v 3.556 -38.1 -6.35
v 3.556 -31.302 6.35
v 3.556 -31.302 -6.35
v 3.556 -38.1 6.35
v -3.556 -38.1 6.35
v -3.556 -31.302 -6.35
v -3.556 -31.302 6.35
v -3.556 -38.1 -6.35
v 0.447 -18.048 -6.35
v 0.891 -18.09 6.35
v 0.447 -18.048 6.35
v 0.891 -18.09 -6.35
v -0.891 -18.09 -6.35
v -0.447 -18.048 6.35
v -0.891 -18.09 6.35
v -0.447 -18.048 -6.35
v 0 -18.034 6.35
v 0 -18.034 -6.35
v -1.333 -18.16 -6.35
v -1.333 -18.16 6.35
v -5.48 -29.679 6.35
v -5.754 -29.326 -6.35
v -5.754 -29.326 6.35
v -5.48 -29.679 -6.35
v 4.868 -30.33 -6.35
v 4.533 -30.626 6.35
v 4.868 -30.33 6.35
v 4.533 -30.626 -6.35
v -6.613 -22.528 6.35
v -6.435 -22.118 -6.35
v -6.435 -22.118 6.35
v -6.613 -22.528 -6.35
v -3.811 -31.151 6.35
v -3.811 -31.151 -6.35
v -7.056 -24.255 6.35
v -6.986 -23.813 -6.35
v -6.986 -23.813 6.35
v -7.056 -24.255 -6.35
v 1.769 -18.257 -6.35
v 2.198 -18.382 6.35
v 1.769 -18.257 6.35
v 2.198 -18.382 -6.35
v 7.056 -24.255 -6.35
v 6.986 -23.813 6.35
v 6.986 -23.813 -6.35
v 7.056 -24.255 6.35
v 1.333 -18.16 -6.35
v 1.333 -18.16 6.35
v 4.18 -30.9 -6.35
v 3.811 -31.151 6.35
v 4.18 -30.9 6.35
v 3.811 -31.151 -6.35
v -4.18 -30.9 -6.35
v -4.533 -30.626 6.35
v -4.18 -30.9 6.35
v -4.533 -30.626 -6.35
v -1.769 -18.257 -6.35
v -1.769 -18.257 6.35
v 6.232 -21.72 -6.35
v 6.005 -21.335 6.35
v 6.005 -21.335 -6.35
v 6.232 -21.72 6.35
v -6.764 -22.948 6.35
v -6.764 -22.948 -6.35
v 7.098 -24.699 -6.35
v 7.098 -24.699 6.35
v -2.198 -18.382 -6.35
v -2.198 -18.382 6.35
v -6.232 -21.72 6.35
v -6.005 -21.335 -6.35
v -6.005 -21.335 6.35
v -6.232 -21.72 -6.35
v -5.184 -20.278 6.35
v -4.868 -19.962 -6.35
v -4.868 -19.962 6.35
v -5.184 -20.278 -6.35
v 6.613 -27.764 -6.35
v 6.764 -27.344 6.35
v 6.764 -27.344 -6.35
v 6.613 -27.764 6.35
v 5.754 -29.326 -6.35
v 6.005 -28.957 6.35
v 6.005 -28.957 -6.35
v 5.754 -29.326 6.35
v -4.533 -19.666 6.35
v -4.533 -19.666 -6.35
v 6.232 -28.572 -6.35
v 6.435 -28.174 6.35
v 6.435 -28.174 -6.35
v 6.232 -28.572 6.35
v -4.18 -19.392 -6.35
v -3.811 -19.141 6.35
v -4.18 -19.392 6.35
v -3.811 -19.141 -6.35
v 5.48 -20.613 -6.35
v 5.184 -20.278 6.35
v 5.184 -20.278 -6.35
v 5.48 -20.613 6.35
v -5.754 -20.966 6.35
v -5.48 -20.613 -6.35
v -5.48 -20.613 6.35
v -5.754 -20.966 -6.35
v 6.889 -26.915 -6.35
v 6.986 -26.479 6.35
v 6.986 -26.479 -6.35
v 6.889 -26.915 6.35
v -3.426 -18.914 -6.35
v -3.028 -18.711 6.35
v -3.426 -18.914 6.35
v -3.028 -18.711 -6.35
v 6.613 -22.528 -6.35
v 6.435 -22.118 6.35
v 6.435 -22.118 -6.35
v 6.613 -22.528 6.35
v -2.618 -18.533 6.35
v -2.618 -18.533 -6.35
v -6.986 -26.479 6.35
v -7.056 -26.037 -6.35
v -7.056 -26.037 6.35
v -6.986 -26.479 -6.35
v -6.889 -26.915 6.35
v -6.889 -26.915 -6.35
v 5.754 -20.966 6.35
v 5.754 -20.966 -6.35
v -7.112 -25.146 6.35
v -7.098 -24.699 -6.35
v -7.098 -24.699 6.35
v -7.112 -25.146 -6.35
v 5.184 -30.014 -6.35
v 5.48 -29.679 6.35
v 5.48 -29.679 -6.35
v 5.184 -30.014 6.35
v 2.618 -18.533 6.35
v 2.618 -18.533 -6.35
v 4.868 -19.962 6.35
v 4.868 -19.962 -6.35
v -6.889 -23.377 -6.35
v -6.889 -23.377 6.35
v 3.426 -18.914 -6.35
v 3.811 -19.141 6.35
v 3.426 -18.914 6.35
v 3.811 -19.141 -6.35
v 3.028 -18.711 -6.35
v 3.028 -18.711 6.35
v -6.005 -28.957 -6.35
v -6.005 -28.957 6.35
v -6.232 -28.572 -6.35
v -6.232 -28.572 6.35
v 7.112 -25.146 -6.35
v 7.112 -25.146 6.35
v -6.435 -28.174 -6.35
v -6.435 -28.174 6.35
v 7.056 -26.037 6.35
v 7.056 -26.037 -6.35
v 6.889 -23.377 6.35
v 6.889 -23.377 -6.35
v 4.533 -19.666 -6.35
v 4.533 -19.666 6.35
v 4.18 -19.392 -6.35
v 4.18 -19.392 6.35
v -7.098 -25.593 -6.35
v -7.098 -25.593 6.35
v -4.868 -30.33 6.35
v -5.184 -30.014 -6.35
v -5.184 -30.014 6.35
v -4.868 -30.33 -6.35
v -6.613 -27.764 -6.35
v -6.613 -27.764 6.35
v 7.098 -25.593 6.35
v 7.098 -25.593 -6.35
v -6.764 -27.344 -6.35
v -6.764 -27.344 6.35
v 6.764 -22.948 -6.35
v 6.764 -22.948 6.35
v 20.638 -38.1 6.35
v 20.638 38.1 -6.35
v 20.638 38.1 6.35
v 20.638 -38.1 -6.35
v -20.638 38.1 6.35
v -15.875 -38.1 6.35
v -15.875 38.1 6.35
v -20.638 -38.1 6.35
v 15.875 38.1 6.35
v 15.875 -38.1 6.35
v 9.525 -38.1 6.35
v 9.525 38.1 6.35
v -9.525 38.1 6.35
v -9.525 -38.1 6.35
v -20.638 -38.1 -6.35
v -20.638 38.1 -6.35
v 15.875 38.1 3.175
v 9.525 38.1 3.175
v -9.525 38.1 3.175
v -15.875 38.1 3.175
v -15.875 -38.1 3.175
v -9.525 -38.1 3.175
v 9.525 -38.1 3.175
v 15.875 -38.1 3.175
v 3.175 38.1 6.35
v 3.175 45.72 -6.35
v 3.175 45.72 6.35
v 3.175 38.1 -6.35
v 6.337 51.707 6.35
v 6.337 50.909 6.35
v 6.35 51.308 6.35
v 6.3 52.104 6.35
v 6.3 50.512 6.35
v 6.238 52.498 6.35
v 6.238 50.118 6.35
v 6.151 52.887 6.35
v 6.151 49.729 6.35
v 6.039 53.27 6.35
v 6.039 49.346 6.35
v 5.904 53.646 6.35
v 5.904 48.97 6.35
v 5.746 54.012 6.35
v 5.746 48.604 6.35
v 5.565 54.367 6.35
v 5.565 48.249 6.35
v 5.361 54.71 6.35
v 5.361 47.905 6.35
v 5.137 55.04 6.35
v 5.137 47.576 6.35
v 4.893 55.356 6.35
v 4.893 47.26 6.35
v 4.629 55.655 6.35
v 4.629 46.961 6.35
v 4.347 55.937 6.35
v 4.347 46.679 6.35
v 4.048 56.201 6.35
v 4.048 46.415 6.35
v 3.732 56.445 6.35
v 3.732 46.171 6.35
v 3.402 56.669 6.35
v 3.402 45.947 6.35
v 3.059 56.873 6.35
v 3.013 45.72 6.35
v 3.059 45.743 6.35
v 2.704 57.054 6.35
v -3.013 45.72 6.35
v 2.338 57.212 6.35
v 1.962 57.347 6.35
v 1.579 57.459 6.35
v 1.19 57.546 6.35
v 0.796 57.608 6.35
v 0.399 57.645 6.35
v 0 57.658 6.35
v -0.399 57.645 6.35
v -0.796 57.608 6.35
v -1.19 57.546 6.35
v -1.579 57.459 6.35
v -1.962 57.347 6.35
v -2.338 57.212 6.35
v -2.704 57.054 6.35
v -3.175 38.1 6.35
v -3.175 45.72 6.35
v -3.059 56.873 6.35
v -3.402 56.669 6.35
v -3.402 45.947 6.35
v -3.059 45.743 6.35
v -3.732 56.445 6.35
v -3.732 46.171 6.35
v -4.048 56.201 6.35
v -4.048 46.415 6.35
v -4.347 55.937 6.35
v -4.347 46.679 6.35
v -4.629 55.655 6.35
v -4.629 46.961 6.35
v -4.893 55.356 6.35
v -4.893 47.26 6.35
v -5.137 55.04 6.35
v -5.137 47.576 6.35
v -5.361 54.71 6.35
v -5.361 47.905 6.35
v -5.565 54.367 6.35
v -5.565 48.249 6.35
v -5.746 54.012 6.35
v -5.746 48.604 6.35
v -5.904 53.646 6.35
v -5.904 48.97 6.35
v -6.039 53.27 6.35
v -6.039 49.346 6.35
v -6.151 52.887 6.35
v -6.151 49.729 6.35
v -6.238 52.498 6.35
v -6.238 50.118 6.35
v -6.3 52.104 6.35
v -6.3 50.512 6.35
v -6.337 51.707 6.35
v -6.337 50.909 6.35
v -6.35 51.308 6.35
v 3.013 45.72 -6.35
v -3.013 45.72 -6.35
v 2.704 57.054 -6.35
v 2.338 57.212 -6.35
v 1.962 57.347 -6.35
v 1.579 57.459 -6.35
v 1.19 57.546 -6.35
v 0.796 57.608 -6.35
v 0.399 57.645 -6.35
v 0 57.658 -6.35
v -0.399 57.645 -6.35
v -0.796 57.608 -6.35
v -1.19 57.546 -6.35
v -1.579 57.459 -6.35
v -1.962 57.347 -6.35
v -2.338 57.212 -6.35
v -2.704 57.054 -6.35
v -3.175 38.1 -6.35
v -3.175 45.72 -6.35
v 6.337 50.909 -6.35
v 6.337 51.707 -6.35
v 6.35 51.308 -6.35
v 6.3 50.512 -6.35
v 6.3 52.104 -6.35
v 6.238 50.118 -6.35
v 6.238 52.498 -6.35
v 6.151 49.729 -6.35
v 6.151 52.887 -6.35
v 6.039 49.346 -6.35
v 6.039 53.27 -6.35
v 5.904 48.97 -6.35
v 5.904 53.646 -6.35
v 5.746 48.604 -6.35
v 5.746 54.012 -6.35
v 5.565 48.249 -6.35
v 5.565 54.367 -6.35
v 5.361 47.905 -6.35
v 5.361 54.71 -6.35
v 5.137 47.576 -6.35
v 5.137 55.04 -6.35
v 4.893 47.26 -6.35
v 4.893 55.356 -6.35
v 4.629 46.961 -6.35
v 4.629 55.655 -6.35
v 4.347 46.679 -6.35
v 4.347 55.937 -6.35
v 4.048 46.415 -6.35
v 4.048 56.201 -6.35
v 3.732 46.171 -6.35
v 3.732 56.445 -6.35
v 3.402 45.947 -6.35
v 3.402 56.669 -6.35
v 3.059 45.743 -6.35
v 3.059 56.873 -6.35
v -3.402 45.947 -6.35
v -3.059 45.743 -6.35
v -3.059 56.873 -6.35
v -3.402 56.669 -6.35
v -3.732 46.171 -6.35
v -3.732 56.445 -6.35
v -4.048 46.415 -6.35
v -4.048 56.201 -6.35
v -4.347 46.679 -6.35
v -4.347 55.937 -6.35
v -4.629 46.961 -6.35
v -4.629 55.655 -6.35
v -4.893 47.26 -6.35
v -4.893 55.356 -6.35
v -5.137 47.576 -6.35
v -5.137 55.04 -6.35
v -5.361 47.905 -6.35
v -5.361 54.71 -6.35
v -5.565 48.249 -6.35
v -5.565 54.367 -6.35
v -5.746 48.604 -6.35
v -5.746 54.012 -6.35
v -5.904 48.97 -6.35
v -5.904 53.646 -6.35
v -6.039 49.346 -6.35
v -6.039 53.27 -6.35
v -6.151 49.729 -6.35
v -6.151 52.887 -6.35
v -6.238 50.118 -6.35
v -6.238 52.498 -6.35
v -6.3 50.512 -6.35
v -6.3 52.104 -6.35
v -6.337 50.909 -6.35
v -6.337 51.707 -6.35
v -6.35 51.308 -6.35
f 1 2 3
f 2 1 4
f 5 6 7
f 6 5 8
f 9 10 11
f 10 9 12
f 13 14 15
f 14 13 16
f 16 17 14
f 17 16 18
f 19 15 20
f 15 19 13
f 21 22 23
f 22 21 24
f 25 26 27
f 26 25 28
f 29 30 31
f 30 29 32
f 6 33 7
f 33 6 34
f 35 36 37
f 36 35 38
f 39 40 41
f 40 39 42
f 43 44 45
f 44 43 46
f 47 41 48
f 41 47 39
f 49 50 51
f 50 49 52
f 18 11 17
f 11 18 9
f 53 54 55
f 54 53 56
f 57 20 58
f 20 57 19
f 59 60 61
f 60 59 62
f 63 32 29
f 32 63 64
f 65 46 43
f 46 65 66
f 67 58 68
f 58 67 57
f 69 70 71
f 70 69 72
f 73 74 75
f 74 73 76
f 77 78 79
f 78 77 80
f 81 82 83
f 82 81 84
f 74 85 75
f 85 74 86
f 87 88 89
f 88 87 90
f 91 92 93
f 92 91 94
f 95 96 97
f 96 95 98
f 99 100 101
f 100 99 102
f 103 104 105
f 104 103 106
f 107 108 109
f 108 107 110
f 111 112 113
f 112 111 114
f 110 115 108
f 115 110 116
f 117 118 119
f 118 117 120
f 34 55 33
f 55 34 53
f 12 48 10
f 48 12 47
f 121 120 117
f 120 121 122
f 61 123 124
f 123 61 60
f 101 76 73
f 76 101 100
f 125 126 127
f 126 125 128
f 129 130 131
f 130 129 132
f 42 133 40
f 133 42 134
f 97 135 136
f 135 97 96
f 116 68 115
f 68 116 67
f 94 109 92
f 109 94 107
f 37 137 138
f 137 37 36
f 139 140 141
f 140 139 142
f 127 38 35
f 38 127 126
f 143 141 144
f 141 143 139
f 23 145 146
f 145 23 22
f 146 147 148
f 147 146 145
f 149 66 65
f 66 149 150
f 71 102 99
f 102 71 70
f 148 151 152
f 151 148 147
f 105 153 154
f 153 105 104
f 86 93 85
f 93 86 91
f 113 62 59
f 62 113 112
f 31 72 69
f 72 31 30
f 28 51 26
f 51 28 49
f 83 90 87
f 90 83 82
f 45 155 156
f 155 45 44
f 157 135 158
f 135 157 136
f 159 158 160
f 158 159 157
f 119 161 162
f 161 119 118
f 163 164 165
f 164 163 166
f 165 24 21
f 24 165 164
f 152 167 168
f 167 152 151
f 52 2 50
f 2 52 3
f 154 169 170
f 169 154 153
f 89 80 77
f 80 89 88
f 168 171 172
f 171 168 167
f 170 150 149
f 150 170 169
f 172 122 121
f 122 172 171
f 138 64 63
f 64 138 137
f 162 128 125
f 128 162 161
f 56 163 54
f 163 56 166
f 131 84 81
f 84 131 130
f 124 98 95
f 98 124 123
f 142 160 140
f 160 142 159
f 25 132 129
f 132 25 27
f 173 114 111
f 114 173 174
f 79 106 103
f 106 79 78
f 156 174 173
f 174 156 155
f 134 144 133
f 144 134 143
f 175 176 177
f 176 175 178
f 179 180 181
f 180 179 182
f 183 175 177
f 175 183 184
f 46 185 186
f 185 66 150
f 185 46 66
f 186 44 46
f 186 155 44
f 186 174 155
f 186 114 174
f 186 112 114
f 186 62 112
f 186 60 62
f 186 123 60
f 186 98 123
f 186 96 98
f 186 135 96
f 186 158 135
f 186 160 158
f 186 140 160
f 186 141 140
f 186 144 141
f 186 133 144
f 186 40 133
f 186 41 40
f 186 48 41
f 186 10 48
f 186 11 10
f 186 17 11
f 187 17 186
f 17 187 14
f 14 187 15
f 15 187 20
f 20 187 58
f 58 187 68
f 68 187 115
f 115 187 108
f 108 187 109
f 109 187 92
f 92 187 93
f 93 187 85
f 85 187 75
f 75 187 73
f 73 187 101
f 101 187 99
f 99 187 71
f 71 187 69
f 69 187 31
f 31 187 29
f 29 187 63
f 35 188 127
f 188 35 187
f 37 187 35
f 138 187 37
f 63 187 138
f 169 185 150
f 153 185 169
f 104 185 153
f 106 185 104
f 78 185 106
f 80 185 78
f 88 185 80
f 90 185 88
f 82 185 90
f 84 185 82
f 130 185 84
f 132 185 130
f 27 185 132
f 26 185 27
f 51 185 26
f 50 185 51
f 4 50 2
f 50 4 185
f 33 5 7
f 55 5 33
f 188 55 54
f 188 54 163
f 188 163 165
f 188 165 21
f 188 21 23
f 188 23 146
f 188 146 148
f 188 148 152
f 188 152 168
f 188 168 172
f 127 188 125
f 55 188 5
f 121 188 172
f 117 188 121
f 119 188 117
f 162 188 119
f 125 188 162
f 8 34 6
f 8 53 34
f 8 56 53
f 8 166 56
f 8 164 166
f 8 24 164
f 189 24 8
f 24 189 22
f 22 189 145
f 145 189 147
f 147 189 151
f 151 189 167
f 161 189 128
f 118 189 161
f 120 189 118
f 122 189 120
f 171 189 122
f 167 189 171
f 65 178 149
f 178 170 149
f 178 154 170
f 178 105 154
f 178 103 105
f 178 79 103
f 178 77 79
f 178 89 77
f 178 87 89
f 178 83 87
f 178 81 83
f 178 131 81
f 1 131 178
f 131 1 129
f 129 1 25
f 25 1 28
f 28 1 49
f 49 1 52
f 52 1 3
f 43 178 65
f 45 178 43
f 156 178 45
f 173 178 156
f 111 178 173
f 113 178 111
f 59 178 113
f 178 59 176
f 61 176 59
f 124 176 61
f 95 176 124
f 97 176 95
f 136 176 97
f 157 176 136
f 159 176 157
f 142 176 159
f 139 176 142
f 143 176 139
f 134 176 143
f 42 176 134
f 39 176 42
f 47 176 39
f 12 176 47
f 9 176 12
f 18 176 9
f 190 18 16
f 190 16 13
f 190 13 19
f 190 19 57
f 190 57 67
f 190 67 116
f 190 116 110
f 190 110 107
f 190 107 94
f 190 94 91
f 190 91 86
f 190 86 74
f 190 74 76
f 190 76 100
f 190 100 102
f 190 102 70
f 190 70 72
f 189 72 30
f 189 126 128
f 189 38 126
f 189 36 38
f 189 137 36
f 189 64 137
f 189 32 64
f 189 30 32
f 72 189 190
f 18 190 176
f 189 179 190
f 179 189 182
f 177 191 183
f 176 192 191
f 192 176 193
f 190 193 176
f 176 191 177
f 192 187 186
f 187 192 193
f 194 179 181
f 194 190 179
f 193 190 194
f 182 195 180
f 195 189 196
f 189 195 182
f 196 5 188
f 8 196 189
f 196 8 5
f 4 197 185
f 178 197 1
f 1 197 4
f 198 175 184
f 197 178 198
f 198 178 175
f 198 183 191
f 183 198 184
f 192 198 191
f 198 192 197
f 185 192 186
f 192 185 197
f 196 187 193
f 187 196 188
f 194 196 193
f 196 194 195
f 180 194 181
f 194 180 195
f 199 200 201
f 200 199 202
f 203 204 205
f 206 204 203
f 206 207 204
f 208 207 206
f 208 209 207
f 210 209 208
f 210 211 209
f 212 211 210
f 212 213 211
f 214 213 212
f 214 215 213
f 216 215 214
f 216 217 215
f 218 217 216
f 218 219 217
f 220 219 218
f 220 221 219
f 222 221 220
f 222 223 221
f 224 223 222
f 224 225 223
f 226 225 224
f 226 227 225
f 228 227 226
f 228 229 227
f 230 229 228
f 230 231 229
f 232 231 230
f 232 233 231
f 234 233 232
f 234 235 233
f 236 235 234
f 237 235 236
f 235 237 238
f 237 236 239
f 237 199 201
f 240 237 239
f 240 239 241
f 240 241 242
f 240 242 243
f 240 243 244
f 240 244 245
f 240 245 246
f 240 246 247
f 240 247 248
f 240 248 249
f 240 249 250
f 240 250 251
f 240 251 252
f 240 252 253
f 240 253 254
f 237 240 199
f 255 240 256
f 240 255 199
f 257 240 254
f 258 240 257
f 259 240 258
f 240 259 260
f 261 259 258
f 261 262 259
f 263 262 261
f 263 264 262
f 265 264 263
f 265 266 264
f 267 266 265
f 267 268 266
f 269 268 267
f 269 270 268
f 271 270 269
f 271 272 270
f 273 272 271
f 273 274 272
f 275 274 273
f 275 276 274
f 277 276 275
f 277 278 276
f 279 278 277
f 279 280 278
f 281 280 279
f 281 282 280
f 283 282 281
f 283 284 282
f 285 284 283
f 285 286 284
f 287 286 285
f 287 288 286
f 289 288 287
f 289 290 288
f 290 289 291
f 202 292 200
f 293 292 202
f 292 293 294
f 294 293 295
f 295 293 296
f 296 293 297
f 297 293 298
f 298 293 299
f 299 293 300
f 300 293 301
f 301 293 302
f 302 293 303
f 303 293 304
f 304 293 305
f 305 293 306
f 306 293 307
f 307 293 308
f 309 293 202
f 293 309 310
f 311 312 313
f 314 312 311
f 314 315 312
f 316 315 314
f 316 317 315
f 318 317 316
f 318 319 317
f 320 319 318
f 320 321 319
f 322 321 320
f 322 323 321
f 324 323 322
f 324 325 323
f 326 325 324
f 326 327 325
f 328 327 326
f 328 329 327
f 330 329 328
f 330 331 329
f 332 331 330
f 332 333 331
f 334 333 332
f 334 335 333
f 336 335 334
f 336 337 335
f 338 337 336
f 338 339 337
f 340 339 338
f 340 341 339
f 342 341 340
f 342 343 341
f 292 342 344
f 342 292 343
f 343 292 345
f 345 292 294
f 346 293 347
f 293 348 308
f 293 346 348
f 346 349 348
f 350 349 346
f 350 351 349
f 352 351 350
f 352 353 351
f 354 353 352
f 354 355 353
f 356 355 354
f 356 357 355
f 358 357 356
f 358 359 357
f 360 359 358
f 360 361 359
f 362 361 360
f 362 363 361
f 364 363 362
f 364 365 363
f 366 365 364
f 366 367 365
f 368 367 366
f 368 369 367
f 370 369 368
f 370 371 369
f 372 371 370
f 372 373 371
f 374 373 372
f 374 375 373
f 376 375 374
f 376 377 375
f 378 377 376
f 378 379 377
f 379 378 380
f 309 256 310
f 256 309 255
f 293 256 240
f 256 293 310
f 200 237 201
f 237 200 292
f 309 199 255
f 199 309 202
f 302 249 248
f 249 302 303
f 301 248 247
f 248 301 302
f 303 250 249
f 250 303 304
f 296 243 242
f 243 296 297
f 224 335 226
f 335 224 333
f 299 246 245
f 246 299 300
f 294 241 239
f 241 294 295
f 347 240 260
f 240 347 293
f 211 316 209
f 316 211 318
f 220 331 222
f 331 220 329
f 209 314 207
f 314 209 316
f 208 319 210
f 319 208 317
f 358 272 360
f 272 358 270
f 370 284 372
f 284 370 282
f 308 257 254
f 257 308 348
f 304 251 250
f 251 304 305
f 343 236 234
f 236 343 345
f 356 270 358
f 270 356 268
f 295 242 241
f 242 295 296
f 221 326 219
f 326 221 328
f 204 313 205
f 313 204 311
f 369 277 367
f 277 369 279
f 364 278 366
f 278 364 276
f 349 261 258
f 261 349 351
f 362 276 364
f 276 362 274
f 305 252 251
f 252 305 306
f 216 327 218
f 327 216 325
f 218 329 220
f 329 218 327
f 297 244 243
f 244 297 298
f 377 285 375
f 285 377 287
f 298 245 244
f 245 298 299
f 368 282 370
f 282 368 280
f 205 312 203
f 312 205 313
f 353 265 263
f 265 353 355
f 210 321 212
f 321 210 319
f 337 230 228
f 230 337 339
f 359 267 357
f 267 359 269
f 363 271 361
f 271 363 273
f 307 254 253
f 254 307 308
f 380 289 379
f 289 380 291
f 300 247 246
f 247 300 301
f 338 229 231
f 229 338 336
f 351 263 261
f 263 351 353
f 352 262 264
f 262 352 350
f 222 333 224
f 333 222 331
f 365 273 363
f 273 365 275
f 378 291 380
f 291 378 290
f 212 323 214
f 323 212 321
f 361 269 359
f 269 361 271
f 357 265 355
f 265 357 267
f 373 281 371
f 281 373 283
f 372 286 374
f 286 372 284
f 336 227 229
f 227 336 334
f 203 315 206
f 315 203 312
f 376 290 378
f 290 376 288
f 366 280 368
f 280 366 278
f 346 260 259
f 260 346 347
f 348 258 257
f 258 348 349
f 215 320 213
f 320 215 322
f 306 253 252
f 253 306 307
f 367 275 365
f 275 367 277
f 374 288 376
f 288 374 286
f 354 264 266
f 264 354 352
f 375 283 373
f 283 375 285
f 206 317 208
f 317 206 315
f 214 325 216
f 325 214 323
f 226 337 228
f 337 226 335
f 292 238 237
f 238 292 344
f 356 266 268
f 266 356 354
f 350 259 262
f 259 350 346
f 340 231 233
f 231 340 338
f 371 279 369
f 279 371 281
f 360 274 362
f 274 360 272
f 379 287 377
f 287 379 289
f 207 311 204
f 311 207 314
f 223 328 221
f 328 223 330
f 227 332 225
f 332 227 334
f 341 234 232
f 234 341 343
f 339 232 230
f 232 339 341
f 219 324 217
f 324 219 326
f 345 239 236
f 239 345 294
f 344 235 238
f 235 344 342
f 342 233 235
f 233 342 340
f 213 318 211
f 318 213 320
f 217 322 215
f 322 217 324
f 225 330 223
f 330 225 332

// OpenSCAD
// file: tracks_lib.scad
function inches(in) = in*25.4;

module outie_connector(z) {
  union() {
   cube([inches(0.25),inches(0.3),z], center=true);
   translate([0,inches(0.37),0]) {
    rotate([0,0,90]) cylinder(h=inches(0.50),r=inches(0.25),center=true,$fn=100); 
   }
  }
}

module innie_connector(z) {
  union() {
   cube([inches(0.28),inches(0.3),z], center=true);
   translate([0,inches(0.37),0]) {
    rotate([0,0,90]) cylinder(h=inches(0.51),r=inches(0.28),center=true,$fn=100); 
   }
  }
}

module train_proxy() {
  color([128,0,128,1]) cube([inches(1),inches(0.25),inches(0.1)], center=true);
}
// main file
use <tracks_lib.scad>

module rail_cube(length) {
  cube(size = [inches(0.25),length+inches(0.1),inches(0.13)], center = true);
}

module straight_track(length) {
    union() {
      difference() {
        // main block
        cube(size = [inches(1+5/8),length,inches(0.5)], center = true);

        // right rail
        translate([inches(0.5),0,inches(0.19)]) {
          rail_cube(length);
        }

        // left rail
        translate([inches(-0.5),0,inches(0.19)]) {
          rail_cube(length);
        }

        translate([0,0-(length/2)-inches(-0.14),0]) {
          innie_connector(inches(0.6));
        }
      }

      translate([0,(length/2)+inches(0.15),0]) {
        outie_connector(inches(0.5));
      }
  
    }
}

straight_track(inches(3));
